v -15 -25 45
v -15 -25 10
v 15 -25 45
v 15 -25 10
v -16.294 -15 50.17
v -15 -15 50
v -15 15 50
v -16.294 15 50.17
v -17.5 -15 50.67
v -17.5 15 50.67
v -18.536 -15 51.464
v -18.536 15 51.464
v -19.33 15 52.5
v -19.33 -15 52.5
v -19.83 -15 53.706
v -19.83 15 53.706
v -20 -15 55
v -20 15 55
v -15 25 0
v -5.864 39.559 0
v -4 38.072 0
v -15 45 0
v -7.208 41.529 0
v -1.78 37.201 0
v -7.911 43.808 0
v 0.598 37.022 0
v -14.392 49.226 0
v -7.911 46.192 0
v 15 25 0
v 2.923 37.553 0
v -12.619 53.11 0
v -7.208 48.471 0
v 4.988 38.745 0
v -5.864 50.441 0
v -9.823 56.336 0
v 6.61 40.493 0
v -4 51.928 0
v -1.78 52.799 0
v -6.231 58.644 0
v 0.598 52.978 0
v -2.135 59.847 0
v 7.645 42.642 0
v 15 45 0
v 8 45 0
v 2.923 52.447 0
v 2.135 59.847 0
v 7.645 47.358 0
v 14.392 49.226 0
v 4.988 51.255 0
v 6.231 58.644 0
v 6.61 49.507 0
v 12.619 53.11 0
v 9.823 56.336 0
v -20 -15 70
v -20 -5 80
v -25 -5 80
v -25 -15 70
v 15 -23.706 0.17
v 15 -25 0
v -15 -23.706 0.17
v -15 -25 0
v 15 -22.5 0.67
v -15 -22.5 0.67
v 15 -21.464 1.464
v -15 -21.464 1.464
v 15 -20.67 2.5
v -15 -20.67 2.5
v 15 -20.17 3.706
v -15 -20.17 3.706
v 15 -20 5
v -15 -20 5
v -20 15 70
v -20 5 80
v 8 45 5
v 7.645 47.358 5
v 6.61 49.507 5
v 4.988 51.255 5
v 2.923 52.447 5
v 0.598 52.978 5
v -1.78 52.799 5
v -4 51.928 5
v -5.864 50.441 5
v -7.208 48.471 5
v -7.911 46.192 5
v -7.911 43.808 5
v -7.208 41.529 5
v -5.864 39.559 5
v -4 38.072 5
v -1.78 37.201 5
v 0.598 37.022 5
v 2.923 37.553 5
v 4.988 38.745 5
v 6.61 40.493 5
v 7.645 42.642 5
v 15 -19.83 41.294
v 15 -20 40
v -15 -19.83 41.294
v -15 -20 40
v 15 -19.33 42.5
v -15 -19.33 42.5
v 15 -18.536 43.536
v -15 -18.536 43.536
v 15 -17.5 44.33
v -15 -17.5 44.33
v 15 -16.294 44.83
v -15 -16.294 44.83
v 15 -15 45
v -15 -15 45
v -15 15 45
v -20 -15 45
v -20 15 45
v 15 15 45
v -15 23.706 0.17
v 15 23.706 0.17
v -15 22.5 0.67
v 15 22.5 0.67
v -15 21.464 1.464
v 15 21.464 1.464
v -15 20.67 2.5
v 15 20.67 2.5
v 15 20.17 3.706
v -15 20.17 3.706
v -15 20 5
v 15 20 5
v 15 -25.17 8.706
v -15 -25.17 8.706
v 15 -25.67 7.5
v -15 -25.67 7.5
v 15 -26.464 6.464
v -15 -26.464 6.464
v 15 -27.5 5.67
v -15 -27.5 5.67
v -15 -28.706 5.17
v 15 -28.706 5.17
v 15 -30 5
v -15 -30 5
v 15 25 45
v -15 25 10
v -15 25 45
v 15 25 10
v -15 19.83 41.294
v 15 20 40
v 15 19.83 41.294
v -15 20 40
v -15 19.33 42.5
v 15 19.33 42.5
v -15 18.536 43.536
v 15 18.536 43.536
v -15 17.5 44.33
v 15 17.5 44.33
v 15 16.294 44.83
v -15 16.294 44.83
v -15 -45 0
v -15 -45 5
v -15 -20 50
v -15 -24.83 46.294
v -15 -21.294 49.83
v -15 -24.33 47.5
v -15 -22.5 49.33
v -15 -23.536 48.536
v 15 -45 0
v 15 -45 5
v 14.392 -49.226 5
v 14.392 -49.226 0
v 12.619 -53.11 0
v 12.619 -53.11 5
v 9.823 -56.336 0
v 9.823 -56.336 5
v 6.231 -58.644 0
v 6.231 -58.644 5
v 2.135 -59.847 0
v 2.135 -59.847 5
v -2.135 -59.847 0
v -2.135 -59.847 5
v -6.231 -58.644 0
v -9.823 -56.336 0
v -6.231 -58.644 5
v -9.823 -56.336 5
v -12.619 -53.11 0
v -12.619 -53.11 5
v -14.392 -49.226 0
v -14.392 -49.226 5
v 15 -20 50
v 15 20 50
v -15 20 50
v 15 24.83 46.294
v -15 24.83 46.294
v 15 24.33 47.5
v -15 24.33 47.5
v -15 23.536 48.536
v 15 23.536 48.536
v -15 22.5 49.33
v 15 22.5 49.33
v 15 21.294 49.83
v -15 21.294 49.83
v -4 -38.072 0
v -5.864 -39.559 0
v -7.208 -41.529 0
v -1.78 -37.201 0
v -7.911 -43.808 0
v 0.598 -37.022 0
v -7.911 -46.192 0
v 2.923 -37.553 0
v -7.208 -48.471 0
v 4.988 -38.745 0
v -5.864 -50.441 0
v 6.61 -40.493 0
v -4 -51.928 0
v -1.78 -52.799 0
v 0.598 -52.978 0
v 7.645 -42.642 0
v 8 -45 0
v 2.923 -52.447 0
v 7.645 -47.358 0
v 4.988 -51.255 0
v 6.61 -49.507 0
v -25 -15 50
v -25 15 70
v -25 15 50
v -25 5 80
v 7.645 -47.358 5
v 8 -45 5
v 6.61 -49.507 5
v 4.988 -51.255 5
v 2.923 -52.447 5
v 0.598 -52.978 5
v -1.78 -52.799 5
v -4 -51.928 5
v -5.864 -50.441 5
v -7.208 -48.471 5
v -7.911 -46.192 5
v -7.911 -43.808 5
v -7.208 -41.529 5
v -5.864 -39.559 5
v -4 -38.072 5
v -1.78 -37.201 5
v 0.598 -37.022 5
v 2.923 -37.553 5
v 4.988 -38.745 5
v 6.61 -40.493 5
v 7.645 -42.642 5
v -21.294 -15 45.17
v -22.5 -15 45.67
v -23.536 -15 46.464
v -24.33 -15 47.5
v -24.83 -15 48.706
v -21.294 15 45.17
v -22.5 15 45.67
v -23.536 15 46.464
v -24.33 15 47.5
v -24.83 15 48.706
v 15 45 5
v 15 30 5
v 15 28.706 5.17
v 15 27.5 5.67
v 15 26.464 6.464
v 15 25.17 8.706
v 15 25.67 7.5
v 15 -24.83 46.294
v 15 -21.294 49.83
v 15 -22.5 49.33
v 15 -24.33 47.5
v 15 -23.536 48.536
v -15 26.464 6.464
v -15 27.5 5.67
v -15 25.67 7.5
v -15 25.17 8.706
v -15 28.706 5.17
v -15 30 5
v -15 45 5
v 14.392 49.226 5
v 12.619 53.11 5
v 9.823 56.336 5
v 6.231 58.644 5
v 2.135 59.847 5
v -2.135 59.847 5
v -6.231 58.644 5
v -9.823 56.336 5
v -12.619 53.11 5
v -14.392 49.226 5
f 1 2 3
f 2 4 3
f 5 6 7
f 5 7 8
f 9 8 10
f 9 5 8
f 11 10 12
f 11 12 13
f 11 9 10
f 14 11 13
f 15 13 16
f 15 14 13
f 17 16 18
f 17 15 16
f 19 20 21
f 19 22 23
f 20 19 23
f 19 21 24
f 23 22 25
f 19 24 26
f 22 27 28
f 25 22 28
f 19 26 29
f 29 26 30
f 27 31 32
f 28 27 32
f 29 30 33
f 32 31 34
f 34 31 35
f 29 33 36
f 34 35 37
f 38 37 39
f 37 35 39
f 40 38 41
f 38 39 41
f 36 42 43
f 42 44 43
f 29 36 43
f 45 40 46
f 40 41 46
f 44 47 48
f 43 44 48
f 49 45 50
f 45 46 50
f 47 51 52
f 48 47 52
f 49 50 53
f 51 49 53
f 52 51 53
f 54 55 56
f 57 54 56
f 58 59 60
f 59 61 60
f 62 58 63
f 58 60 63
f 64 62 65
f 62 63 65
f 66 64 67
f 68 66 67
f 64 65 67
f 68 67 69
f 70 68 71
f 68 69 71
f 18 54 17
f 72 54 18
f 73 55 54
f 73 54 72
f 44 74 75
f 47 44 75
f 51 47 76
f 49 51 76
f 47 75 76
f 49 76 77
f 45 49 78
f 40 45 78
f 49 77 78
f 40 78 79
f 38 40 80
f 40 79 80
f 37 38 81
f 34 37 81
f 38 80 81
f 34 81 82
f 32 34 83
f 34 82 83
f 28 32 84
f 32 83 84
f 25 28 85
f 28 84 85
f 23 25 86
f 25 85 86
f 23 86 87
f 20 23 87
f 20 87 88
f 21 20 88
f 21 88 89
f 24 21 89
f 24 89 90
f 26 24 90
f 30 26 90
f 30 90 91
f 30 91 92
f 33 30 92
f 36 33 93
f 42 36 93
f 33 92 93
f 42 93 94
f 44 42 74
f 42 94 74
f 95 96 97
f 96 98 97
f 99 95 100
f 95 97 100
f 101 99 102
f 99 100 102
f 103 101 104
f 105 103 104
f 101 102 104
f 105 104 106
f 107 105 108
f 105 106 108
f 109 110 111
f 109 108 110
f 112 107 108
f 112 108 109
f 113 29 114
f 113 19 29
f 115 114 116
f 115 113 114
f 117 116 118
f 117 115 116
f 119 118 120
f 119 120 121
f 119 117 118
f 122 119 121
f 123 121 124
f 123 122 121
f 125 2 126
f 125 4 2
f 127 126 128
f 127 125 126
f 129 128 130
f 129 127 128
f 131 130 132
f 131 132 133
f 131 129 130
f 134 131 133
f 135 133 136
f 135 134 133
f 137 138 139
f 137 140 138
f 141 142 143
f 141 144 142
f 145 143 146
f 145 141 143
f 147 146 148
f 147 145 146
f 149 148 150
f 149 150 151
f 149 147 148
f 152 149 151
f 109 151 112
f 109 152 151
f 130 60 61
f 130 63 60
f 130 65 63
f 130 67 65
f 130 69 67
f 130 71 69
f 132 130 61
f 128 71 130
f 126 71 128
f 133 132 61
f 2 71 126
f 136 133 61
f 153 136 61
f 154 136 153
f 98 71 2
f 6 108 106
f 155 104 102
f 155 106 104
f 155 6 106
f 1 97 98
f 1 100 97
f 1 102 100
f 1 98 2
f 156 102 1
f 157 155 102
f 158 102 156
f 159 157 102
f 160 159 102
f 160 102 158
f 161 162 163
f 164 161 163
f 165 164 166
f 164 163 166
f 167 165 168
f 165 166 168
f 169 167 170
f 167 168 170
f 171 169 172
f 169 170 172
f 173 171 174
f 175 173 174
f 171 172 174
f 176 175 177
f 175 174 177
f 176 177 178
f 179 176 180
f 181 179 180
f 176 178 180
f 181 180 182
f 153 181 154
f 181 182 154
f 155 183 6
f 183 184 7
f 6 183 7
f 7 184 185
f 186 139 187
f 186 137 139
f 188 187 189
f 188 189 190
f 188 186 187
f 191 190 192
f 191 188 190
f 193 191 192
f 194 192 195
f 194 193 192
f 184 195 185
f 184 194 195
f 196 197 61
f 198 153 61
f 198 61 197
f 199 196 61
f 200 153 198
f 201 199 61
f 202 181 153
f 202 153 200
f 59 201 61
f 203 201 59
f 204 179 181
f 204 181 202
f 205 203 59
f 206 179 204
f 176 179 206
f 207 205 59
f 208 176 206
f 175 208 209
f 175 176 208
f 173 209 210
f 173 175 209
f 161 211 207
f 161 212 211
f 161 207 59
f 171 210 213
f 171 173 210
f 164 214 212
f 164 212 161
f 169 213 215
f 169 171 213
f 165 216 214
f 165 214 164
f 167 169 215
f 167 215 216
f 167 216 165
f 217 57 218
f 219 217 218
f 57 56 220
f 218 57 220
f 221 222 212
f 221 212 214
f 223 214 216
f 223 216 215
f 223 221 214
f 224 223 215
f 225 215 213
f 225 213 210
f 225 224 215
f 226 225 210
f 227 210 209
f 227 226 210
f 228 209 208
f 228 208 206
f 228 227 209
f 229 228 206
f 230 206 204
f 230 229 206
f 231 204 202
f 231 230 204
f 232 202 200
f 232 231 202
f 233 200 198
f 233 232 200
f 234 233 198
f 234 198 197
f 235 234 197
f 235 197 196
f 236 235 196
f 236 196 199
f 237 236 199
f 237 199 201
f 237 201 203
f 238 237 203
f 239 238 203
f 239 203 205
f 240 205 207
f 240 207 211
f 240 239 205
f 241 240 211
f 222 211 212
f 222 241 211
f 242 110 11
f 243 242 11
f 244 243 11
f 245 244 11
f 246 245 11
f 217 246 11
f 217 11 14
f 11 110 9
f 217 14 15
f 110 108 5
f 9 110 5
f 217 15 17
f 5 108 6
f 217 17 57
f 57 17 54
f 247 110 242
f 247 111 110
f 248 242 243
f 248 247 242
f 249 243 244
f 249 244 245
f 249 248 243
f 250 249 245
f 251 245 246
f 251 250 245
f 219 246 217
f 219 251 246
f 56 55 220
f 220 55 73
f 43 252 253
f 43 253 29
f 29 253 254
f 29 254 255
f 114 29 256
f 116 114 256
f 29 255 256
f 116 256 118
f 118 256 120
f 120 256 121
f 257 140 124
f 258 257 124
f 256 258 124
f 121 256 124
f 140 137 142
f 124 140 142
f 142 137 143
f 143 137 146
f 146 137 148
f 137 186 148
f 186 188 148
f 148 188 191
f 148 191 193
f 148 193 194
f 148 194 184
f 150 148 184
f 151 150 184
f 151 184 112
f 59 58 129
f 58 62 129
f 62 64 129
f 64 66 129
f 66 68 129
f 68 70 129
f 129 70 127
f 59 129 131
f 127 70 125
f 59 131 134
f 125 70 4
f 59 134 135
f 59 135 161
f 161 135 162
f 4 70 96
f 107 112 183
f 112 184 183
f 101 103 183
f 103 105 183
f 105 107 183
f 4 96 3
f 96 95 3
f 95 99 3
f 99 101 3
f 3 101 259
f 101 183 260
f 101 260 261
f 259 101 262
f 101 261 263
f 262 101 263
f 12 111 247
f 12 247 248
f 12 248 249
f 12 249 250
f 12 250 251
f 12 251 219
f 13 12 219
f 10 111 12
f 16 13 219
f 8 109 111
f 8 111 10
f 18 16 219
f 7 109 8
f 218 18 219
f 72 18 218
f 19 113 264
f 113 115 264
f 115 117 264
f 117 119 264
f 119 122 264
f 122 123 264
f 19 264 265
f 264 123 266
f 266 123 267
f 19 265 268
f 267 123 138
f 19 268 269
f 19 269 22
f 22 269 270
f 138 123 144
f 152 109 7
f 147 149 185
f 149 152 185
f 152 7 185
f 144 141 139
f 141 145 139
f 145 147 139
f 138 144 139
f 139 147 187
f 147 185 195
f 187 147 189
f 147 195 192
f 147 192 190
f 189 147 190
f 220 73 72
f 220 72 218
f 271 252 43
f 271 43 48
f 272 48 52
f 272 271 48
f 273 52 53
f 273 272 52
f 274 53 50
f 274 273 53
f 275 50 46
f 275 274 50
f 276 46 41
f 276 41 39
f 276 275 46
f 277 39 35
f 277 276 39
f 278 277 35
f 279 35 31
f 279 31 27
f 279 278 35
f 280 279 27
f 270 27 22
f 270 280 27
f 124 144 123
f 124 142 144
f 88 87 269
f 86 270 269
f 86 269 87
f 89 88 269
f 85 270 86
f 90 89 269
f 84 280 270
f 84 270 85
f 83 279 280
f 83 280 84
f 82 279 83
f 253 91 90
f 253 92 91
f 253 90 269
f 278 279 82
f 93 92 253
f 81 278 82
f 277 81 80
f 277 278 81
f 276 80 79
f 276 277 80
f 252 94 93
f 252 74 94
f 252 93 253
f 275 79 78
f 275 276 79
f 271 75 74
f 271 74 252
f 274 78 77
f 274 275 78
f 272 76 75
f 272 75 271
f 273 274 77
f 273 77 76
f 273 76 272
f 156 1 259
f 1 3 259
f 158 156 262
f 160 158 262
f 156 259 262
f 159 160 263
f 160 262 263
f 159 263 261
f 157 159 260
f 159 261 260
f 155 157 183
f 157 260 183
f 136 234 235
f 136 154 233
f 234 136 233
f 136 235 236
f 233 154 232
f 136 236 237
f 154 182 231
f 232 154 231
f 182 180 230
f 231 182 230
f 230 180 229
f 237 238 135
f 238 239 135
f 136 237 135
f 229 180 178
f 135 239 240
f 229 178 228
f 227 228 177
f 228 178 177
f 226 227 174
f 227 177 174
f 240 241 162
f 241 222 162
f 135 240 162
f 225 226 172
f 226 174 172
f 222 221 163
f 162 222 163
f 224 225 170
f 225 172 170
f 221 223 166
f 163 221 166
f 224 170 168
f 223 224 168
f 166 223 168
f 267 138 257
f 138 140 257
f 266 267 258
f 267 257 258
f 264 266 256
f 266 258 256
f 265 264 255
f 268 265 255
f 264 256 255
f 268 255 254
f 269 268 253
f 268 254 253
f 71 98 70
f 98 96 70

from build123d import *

# Parameters (mm, degrees)
BOSS_EXTRUDE1_DEPTH = 15
FILLET1_R           = 5
FILLET2_R           = 5
SKETCH4_W           = 5
SKETCH4_H           = 5
BOSS_EXTRUDE2_DEPTH = 15
SKETCH6_W           = 15
SKETCH6_H           = 35
BOSS_EXTRUDE3_DEPTH = 5
FILLET3_R           = 5
CHAMFER1_SIZE       = 10
BOSS_EXTRUDE4_DEPTH = 5
SKETCH9_R           = 8
CUT_EXTRUDE6_DEPTH  = 5


with BuildPart() as part:
    # Sketch1 → Boss-Extrude1 (new body, symmetric)
    with BuildSketch(Plane.YZ):
        Polygon((45, 0), (45, 5), (25, 5), (25, 50), (0, 50), (0, 45), (20, 45), (20, 0), align=None)
    extrude(amount=BOSS_EXTRUDE1_DEPTH, both=True)

    # Fillet1
    fillet1_edges = [part.edges().sort_by_distance(p)[0] for p in [
        (0, 25, 5),
    ]]
    fillet(fillet1_edges, radius=FILLET1_R)

    # Fillet2
    fillet2_edges = [part.edges().sort_by_distance(p)[0] for p in [
        (0, 20, 0),
        (0, 20, 45),
        (0, 25, 50),
    ]]
    fillet(fillet2_edges, radius=FILLET2_R)

    # Sketch4 → Boss-Extrude2 (add)
    with BuildSketch(Plane(origin=(0, 0, 0), x_dir=(-1, 0, 0), z_dir=(0, 1, 0))):
        with Locations((17.5, 47.5)):
            Rectangle(SKETCH4_W, SKETCH4_H)
    extrude(amount=BOSS_EXTRUDE2_DEPTH)

    # Sketch6 → Boss-Extrude3 (add)
    with BuildSketch(Plane(origin=(-20, 0, 0), x_dir=(0, -1, 0), z_dir=(-1, 0, 0))):
        with Locations((-7.5, 62.5)):
            Rectangle(SKETCH6_W, SKETCH6_H)
    extrude(amount=BOSS_EXTRUDE3_DEPTH)

    # Fillet3
    fillet3_edges = [part.edges().sort_by_distance(p)[0] for p in [
        (-25, 7.5, 45),
        (-20, 7.5, 50),
    ]]
    fillet(fillet3_edges, radius=FILLET3_R)

    # Chamfer1
    chamfer1_edges = [part.edges().sort_by_distance(p)[0] for p in [
        (-22.5, 15, 80),
    ]]
    chamfer(chamfer1_edges, length=CHAMFER1_SIZE)

    # Sketch8 → Boss-Extrude4 (add)
    with BuildSketch(Plane.XY.offset(5)):
        with BuildLine():
            Line((-15, 45), (15, 45))
            ThreePointArc((15, 45), (0, 60), (-15, 45))
        make_face()
    extrude(amount=-BOSS_EXTRUDE4_DEPTH)

    # Sketch9 → Cut-Extrude6 (cut)
    with BuildSketch(Plane.XY.offset(5)):
        with Locations((0, 45)):
            Circle(SKETCH9_R)
    extrude(amount=-CUT_EXTRUDE6_DEPTH, mode=Mode.SUBTRACT)

    # Mirror2: part across plane


with BuildPart() as part_1:
    add(part.part)
    add(part.part.mirror(Plane(origin=(15, 0, 50), x_dir=(0, 0, 1), z_dir=(0, 1, 0))))


solid = part_1.part
